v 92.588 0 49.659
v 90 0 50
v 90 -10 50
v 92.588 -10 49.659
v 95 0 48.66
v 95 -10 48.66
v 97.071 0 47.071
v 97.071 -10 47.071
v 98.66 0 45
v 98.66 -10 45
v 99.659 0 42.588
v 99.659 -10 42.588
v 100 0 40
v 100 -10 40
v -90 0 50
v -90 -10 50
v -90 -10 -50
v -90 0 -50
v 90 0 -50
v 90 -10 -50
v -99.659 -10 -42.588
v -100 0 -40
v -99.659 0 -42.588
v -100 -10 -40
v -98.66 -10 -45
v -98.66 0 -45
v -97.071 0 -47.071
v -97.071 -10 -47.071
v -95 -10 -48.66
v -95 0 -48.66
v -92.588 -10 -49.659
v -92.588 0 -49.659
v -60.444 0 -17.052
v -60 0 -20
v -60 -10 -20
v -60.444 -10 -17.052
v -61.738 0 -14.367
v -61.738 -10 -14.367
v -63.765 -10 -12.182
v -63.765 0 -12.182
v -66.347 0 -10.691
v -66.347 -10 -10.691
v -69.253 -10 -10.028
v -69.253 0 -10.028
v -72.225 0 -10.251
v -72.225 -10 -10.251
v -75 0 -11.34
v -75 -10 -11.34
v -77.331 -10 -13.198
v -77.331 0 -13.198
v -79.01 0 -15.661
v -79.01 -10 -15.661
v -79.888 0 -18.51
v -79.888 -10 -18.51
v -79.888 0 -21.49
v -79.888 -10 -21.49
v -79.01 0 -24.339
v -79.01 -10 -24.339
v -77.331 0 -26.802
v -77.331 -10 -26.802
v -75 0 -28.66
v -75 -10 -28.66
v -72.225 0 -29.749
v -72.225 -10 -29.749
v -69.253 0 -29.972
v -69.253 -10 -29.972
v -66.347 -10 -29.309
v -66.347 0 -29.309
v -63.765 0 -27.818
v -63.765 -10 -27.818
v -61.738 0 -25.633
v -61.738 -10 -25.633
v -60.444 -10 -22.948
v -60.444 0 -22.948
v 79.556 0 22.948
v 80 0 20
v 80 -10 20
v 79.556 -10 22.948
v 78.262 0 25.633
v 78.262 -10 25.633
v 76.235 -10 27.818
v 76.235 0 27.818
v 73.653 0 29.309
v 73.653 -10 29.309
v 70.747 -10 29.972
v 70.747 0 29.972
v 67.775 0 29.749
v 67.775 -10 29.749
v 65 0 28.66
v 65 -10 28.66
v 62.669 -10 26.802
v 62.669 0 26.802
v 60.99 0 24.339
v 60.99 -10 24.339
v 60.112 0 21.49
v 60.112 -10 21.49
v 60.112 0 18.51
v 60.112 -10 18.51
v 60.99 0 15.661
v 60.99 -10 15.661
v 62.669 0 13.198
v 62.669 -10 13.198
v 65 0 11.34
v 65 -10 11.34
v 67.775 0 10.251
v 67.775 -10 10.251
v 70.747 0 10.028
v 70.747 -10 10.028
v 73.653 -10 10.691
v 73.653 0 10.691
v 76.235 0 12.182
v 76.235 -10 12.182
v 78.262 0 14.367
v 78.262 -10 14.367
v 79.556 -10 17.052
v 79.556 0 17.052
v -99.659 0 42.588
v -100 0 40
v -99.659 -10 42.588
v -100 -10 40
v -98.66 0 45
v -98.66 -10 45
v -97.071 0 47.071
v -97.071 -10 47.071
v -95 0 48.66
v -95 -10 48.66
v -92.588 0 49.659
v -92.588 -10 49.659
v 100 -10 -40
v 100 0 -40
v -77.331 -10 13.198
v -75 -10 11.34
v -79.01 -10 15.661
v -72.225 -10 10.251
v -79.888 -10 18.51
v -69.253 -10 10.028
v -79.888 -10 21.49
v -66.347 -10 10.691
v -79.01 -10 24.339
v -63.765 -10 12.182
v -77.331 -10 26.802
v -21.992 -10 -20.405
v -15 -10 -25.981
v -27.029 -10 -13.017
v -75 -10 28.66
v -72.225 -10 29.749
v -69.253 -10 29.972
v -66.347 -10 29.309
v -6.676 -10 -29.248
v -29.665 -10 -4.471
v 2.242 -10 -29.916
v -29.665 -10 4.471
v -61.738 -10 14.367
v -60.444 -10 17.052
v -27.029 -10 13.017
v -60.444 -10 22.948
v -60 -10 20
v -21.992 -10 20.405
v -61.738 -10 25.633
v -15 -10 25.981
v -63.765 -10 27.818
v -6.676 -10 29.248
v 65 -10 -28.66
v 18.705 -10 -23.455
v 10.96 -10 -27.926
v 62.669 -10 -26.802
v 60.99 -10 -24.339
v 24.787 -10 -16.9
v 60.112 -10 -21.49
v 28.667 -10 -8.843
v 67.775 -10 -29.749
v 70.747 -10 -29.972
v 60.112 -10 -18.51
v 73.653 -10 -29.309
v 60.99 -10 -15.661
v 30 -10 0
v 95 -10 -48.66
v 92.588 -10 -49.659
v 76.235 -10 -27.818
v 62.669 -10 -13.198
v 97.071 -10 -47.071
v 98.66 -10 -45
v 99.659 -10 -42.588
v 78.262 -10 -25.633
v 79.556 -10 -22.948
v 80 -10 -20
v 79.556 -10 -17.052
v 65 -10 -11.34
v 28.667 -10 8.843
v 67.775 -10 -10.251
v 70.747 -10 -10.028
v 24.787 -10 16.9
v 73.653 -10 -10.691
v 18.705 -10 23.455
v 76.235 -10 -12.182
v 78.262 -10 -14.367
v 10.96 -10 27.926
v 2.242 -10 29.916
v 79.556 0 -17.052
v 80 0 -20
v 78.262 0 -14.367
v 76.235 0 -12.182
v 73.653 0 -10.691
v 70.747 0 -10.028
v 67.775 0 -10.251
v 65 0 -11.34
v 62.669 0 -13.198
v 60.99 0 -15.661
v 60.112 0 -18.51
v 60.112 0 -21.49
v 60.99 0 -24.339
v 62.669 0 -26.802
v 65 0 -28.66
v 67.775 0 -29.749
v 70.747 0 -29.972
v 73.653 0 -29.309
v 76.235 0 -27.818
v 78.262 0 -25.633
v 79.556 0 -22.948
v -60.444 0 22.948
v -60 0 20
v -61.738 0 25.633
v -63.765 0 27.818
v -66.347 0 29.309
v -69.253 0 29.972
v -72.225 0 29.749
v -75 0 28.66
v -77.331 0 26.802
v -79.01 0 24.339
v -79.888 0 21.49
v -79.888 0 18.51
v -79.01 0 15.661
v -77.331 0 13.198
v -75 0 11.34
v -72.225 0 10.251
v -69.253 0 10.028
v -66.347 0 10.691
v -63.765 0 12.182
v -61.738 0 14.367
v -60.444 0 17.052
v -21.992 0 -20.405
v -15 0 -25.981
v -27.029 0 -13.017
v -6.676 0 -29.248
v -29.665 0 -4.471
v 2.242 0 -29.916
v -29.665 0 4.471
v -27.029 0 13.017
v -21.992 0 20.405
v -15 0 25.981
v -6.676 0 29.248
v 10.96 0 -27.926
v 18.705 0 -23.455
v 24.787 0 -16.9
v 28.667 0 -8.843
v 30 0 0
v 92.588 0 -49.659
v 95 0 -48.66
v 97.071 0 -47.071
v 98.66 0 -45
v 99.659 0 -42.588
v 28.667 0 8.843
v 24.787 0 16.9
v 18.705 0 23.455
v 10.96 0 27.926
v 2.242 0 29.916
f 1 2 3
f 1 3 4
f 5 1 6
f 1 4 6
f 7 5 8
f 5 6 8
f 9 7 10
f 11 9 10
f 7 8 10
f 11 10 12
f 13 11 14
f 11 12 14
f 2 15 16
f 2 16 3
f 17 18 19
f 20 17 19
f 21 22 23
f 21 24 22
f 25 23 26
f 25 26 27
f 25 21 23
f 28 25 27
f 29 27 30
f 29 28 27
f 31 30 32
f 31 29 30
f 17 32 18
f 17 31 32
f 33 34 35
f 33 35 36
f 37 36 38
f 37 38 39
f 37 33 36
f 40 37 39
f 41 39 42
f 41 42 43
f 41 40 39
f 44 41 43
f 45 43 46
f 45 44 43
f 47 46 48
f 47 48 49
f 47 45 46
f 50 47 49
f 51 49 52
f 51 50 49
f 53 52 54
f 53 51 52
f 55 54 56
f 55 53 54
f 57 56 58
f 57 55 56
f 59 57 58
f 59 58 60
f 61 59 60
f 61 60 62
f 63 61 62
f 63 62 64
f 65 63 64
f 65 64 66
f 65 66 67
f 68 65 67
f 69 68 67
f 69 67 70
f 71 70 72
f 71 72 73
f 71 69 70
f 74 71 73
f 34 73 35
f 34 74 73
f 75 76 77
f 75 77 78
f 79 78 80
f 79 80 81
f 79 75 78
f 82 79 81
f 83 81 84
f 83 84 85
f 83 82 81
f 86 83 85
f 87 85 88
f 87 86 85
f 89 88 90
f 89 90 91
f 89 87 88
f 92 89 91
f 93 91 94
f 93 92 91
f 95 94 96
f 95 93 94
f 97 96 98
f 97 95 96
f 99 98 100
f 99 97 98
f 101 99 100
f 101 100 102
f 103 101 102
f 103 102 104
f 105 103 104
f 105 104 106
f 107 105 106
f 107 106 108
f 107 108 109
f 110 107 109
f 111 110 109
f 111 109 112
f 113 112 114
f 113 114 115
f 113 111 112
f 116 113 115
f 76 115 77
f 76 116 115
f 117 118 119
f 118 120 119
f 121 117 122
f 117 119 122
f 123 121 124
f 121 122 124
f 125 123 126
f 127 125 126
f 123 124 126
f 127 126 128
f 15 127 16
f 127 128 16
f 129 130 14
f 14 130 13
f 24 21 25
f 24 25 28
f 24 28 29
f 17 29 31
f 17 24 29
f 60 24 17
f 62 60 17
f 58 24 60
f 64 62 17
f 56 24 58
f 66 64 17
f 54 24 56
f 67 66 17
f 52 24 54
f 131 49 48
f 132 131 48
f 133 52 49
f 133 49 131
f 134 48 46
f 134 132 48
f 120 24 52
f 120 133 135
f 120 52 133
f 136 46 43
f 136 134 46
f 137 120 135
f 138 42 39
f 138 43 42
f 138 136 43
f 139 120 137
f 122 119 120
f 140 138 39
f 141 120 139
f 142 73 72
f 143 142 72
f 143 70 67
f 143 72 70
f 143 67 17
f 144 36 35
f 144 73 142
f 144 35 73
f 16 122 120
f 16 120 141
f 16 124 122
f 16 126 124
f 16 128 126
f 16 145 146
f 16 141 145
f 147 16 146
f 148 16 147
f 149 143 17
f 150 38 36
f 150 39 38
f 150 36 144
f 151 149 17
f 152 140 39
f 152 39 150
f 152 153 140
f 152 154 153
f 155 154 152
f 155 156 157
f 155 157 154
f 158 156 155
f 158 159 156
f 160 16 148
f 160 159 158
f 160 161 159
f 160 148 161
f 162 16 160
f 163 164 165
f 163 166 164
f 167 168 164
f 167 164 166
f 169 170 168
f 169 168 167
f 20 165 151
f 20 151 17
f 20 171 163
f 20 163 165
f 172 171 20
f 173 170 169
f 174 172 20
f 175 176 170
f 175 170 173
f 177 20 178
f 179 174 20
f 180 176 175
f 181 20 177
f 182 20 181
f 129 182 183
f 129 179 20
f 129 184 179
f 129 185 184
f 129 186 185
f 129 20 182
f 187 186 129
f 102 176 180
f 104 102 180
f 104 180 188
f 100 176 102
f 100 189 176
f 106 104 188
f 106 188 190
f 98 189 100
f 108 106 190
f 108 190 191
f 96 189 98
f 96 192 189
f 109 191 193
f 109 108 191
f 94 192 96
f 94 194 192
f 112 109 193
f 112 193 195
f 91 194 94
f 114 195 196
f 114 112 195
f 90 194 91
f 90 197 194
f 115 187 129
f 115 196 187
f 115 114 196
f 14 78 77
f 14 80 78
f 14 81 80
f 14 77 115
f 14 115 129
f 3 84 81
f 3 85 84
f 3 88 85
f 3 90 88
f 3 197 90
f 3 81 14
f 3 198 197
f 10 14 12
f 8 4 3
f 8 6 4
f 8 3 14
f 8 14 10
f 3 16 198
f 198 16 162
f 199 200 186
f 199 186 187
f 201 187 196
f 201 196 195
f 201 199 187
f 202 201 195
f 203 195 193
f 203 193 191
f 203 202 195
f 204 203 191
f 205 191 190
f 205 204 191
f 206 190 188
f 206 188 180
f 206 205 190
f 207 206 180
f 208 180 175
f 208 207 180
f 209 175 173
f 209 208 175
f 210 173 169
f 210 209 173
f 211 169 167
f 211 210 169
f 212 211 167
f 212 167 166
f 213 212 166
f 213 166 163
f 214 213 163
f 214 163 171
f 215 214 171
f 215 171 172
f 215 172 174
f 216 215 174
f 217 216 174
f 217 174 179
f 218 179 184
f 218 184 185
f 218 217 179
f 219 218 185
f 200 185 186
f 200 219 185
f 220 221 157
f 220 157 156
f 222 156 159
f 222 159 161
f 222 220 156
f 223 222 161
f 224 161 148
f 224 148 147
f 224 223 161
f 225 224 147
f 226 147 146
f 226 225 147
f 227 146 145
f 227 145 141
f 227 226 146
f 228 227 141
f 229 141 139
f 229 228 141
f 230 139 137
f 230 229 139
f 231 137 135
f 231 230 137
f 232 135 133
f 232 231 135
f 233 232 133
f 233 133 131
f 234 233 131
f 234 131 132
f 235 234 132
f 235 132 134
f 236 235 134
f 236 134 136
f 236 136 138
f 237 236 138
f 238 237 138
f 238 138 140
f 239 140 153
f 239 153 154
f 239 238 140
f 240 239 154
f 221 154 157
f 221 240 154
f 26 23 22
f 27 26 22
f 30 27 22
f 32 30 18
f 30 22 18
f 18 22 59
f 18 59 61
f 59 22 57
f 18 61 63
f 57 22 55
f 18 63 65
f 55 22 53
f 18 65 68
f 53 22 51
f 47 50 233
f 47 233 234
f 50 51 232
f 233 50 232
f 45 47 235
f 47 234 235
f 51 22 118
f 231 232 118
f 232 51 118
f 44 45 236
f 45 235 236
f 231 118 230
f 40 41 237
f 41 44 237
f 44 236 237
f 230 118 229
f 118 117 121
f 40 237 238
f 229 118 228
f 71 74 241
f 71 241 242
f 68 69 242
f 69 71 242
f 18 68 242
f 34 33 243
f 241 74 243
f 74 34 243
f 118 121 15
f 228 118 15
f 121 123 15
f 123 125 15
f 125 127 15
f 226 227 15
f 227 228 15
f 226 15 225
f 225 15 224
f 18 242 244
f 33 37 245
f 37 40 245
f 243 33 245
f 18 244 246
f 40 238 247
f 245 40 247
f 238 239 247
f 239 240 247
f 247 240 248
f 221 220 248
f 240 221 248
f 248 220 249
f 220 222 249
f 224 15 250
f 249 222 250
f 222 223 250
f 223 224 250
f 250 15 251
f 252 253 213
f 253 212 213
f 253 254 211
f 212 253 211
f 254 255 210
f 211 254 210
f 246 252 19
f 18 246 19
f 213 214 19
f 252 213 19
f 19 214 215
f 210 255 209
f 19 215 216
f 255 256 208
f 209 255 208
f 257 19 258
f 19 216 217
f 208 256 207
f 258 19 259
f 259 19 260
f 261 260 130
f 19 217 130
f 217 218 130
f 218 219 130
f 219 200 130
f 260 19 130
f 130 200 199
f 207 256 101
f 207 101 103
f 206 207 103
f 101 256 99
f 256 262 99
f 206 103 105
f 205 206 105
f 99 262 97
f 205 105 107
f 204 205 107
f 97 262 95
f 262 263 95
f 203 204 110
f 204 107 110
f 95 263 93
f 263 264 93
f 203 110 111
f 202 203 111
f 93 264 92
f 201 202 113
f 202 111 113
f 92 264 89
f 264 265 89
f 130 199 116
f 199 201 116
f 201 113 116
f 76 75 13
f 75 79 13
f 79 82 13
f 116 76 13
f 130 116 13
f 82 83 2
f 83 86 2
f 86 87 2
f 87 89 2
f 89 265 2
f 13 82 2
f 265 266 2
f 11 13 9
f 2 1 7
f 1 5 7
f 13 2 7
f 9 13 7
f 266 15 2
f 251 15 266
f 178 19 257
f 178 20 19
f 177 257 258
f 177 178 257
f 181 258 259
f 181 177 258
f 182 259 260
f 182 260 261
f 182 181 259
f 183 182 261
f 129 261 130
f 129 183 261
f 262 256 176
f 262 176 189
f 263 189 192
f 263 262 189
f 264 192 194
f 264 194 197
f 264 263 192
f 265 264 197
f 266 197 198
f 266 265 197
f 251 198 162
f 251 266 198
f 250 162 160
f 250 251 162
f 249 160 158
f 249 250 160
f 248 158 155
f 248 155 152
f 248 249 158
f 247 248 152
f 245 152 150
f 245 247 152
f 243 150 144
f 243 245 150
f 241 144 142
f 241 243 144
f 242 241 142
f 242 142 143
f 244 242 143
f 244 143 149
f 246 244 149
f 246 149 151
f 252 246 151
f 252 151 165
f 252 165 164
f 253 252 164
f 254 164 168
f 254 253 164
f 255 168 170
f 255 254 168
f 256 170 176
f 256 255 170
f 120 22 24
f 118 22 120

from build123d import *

# Parameters (mm, degrees)
SKETCH_W    = 200
SKETCH_H    = 100
SKETCH_R    = 30
SKETCH_R_2  = 10
PAD_DEPTH   = 10
FILLET_R    = 10
FILLET001_R = 10


with BuildPart() as part:
    # Sketch → Pad (new body)
    with BuildSketch(Plane.XZ):
        Rectangle(SKETCH_W, SKETCH_H)
        Circle(SKETCH_R, mode=Mode.SUBTRACT)
        with Locations((-70, 20)):
            Circle(SKETCH_R_2, mode=Mode.SUBTRACT)
        with Locations((70, 20)):
            Circle(SKETCH_R_2, mode=Mode.SUBTRACT)
        with Locations((70, -20)):
            Circle(SKETCH_R_2, mode=Mode.SUBTRACT)
        with Locations((-70, -20)):
            Circle(SKETCH_R_2, mode=Mode.SUBTRACT)
    extrude(amount=PAD_DEPTH)

    # Fillet
    fillet_edges = [part.edges().sort_by_distance(p)[0] for p in [
        (100, -5, -50),
        (100, -5, 50),
        (-100, -5, 50),
    ]]
    fillet(fillet_edges, radius=FILLET_R)

    # Fillet001
    fillet001_edges = [part.edges().sort_by_distance(p)[0] for p in [
        (-100, -5, -50),
    ]]
    fillet(fillet001_edges, radius=FILLET001_R)


solid = part.part
